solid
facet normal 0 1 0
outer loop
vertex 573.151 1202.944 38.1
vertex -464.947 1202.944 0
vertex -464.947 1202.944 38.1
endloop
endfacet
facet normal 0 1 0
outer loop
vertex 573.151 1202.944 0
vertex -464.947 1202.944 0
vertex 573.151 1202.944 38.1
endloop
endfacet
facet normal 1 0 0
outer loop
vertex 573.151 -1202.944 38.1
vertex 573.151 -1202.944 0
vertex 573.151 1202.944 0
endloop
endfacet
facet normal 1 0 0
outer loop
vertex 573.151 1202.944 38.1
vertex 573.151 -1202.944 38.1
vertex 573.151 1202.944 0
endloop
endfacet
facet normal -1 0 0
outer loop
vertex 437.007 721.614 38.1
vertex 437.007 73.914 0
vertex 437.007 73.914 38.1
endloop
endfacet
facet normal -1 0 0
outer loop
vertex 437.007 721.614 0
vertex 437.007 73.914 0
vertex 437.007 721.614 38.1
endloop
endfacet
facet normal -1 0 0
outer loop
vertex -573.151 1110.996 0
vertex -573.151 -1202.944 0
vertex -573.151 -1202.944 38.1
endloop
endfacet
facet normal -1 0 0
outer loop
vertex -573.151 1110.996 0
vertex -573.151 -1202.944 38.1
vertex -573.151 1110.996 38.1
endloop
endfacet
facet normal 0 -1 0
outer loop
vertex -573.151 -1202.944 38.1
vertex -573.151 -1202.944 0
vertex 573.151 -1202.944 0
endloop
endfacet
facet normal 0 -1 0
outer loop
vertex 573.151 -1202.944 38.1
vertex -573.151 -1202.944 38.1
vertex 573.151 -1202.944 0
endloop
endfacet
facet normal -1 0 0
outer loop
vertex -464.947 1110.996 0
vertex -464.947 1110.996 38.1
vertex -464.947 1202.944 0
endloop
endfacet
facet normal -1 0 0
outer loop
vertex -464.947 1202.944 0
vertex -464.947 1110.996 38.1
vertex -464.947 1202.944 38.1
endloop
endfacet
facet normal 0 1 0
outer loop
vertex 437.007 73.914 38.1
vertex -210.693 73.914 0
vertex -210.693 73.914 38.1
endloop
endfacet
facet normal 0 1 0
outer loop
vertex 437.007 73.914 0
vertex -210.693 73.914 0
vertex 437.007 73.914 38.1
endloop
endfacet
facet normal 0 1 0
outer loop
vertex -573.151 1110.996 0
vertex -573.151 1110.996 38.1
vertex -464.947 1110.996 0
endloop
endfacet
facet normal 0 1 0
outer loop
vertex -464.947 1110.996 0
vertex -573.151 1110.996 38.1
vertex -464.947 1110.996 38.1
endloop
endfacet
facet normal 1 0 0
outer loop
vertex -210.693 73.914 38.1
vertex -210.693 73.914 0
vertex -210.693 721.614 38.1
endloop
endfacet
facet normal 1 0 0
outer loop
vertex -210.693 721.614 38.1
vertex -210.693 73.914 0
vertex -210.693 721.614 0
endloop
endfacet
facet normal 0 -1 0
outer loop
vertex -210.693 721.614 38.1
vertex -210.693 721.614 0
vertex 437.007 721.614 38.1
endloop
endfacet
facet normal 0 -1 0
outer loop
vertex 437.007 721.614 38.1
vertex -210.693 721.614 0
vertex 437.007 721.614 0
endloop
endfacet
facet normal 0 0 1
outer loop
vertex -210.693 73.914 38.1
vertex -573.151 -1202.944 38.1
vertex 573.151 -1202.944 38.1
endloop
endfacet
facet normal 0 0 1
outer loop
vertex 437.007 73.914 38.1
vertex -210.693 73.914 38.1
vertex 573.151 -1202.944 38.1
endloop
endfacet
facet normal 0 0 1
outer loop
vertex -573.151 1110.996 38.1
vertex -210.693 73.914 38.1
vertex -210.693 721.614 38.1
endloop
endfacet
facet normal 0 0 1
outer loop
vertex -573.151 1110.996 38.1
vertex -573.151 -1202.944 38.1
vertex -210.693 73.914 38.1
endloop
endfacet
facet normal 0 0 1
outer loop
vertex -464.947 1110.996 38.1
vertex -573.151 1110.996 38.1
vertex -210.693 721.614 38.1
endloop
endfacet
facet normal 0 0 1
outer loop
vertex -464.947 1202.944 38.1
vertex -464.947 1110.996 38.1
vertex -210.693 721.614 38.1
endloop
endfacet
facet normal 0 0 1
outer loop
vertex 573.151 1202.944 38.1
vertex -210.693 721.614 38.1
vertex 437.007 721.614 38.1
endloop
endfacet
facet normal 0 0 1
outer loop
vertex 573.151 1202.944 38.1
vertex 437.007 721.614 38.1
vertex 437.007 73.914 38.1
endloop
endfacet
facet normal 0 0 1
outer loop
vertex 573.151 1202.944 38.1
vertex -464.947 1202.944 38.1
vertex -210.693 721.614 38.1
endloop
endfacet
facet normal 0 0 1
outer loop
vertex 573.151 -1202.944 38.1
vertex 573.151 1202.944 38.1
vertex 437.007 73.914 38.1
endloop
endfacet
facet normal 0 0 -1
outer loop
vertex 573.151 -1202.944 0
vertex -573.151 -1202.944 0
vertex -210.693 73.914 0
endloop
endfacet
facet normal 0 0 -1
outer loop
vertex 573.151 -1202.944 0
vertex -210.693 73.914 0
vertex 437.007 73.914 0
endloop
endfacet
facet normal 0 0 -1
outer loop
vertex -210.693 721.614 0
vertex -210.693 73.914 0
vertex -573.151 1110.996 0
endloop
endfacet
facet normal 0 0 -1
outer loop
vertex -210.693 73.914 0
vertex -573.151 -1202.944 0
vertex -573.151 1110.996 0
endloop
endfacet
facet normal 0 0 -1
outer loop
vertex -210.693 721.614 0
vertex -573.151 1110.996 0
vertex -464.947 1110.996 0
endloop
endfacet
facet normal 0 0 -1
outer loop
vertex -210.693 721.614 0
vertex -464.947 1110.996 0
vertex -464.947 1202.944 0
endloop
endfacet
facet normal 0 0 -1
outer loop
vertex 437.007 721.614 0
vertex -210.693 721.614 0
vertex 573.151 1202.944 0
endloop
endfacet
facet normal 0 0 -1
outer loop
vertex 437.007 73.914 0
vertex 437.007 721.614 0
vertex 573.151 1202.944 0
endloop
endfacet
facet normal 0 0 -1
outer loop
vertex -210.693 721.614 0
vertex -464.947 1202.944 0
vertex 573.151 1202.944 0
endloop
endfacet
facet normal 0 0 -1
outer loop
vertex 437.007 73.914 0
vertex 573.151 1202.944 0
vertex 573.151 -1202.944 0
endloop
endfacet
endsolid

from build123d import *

# Parameters (mm, degrees)
SKETCH1_W           = 1146.302
SKETCH1_H           = 2405.888
SKETCH1_W_2         = 647.7
SKETCH1_H_2         = 647.7
BOSS_EXTRUDE1_DEPTH = 38.1
SKETCH2_W           = 108.204
SKETCH2_H           = 91.948
CUT_EXTRUDE1_DEPTH  = 38.1


with BuildPart() as part:
    # Sketch1 → Boss-Extrude1 (new body)
    with BuildSketch(Plane.XY):
        Rectangle(SKETCH1_W, SKETCH1_H)
        with Locations((113.157, 397.764)):
            Rectangle(SKETCH1_W_2, SKETCH1_H_2, mode=Mode.SUBTRACT)
    extrude(amount=BOSS_EXTRUDE1_DEPTH)

    # Sketch2 → Cut-Extrude1 (cut)
    with BuildSketch(Plane.XY.offset(38.1)):
        with Locations((-519.049, 1156.97)):
            Rectangle(SKETCH2_W, SKETCH2_H)
    extrude(amount=-CUT_EXTRUDE1_DEPTH, mode=Mode.SUBTRACT)


solid = part.part
